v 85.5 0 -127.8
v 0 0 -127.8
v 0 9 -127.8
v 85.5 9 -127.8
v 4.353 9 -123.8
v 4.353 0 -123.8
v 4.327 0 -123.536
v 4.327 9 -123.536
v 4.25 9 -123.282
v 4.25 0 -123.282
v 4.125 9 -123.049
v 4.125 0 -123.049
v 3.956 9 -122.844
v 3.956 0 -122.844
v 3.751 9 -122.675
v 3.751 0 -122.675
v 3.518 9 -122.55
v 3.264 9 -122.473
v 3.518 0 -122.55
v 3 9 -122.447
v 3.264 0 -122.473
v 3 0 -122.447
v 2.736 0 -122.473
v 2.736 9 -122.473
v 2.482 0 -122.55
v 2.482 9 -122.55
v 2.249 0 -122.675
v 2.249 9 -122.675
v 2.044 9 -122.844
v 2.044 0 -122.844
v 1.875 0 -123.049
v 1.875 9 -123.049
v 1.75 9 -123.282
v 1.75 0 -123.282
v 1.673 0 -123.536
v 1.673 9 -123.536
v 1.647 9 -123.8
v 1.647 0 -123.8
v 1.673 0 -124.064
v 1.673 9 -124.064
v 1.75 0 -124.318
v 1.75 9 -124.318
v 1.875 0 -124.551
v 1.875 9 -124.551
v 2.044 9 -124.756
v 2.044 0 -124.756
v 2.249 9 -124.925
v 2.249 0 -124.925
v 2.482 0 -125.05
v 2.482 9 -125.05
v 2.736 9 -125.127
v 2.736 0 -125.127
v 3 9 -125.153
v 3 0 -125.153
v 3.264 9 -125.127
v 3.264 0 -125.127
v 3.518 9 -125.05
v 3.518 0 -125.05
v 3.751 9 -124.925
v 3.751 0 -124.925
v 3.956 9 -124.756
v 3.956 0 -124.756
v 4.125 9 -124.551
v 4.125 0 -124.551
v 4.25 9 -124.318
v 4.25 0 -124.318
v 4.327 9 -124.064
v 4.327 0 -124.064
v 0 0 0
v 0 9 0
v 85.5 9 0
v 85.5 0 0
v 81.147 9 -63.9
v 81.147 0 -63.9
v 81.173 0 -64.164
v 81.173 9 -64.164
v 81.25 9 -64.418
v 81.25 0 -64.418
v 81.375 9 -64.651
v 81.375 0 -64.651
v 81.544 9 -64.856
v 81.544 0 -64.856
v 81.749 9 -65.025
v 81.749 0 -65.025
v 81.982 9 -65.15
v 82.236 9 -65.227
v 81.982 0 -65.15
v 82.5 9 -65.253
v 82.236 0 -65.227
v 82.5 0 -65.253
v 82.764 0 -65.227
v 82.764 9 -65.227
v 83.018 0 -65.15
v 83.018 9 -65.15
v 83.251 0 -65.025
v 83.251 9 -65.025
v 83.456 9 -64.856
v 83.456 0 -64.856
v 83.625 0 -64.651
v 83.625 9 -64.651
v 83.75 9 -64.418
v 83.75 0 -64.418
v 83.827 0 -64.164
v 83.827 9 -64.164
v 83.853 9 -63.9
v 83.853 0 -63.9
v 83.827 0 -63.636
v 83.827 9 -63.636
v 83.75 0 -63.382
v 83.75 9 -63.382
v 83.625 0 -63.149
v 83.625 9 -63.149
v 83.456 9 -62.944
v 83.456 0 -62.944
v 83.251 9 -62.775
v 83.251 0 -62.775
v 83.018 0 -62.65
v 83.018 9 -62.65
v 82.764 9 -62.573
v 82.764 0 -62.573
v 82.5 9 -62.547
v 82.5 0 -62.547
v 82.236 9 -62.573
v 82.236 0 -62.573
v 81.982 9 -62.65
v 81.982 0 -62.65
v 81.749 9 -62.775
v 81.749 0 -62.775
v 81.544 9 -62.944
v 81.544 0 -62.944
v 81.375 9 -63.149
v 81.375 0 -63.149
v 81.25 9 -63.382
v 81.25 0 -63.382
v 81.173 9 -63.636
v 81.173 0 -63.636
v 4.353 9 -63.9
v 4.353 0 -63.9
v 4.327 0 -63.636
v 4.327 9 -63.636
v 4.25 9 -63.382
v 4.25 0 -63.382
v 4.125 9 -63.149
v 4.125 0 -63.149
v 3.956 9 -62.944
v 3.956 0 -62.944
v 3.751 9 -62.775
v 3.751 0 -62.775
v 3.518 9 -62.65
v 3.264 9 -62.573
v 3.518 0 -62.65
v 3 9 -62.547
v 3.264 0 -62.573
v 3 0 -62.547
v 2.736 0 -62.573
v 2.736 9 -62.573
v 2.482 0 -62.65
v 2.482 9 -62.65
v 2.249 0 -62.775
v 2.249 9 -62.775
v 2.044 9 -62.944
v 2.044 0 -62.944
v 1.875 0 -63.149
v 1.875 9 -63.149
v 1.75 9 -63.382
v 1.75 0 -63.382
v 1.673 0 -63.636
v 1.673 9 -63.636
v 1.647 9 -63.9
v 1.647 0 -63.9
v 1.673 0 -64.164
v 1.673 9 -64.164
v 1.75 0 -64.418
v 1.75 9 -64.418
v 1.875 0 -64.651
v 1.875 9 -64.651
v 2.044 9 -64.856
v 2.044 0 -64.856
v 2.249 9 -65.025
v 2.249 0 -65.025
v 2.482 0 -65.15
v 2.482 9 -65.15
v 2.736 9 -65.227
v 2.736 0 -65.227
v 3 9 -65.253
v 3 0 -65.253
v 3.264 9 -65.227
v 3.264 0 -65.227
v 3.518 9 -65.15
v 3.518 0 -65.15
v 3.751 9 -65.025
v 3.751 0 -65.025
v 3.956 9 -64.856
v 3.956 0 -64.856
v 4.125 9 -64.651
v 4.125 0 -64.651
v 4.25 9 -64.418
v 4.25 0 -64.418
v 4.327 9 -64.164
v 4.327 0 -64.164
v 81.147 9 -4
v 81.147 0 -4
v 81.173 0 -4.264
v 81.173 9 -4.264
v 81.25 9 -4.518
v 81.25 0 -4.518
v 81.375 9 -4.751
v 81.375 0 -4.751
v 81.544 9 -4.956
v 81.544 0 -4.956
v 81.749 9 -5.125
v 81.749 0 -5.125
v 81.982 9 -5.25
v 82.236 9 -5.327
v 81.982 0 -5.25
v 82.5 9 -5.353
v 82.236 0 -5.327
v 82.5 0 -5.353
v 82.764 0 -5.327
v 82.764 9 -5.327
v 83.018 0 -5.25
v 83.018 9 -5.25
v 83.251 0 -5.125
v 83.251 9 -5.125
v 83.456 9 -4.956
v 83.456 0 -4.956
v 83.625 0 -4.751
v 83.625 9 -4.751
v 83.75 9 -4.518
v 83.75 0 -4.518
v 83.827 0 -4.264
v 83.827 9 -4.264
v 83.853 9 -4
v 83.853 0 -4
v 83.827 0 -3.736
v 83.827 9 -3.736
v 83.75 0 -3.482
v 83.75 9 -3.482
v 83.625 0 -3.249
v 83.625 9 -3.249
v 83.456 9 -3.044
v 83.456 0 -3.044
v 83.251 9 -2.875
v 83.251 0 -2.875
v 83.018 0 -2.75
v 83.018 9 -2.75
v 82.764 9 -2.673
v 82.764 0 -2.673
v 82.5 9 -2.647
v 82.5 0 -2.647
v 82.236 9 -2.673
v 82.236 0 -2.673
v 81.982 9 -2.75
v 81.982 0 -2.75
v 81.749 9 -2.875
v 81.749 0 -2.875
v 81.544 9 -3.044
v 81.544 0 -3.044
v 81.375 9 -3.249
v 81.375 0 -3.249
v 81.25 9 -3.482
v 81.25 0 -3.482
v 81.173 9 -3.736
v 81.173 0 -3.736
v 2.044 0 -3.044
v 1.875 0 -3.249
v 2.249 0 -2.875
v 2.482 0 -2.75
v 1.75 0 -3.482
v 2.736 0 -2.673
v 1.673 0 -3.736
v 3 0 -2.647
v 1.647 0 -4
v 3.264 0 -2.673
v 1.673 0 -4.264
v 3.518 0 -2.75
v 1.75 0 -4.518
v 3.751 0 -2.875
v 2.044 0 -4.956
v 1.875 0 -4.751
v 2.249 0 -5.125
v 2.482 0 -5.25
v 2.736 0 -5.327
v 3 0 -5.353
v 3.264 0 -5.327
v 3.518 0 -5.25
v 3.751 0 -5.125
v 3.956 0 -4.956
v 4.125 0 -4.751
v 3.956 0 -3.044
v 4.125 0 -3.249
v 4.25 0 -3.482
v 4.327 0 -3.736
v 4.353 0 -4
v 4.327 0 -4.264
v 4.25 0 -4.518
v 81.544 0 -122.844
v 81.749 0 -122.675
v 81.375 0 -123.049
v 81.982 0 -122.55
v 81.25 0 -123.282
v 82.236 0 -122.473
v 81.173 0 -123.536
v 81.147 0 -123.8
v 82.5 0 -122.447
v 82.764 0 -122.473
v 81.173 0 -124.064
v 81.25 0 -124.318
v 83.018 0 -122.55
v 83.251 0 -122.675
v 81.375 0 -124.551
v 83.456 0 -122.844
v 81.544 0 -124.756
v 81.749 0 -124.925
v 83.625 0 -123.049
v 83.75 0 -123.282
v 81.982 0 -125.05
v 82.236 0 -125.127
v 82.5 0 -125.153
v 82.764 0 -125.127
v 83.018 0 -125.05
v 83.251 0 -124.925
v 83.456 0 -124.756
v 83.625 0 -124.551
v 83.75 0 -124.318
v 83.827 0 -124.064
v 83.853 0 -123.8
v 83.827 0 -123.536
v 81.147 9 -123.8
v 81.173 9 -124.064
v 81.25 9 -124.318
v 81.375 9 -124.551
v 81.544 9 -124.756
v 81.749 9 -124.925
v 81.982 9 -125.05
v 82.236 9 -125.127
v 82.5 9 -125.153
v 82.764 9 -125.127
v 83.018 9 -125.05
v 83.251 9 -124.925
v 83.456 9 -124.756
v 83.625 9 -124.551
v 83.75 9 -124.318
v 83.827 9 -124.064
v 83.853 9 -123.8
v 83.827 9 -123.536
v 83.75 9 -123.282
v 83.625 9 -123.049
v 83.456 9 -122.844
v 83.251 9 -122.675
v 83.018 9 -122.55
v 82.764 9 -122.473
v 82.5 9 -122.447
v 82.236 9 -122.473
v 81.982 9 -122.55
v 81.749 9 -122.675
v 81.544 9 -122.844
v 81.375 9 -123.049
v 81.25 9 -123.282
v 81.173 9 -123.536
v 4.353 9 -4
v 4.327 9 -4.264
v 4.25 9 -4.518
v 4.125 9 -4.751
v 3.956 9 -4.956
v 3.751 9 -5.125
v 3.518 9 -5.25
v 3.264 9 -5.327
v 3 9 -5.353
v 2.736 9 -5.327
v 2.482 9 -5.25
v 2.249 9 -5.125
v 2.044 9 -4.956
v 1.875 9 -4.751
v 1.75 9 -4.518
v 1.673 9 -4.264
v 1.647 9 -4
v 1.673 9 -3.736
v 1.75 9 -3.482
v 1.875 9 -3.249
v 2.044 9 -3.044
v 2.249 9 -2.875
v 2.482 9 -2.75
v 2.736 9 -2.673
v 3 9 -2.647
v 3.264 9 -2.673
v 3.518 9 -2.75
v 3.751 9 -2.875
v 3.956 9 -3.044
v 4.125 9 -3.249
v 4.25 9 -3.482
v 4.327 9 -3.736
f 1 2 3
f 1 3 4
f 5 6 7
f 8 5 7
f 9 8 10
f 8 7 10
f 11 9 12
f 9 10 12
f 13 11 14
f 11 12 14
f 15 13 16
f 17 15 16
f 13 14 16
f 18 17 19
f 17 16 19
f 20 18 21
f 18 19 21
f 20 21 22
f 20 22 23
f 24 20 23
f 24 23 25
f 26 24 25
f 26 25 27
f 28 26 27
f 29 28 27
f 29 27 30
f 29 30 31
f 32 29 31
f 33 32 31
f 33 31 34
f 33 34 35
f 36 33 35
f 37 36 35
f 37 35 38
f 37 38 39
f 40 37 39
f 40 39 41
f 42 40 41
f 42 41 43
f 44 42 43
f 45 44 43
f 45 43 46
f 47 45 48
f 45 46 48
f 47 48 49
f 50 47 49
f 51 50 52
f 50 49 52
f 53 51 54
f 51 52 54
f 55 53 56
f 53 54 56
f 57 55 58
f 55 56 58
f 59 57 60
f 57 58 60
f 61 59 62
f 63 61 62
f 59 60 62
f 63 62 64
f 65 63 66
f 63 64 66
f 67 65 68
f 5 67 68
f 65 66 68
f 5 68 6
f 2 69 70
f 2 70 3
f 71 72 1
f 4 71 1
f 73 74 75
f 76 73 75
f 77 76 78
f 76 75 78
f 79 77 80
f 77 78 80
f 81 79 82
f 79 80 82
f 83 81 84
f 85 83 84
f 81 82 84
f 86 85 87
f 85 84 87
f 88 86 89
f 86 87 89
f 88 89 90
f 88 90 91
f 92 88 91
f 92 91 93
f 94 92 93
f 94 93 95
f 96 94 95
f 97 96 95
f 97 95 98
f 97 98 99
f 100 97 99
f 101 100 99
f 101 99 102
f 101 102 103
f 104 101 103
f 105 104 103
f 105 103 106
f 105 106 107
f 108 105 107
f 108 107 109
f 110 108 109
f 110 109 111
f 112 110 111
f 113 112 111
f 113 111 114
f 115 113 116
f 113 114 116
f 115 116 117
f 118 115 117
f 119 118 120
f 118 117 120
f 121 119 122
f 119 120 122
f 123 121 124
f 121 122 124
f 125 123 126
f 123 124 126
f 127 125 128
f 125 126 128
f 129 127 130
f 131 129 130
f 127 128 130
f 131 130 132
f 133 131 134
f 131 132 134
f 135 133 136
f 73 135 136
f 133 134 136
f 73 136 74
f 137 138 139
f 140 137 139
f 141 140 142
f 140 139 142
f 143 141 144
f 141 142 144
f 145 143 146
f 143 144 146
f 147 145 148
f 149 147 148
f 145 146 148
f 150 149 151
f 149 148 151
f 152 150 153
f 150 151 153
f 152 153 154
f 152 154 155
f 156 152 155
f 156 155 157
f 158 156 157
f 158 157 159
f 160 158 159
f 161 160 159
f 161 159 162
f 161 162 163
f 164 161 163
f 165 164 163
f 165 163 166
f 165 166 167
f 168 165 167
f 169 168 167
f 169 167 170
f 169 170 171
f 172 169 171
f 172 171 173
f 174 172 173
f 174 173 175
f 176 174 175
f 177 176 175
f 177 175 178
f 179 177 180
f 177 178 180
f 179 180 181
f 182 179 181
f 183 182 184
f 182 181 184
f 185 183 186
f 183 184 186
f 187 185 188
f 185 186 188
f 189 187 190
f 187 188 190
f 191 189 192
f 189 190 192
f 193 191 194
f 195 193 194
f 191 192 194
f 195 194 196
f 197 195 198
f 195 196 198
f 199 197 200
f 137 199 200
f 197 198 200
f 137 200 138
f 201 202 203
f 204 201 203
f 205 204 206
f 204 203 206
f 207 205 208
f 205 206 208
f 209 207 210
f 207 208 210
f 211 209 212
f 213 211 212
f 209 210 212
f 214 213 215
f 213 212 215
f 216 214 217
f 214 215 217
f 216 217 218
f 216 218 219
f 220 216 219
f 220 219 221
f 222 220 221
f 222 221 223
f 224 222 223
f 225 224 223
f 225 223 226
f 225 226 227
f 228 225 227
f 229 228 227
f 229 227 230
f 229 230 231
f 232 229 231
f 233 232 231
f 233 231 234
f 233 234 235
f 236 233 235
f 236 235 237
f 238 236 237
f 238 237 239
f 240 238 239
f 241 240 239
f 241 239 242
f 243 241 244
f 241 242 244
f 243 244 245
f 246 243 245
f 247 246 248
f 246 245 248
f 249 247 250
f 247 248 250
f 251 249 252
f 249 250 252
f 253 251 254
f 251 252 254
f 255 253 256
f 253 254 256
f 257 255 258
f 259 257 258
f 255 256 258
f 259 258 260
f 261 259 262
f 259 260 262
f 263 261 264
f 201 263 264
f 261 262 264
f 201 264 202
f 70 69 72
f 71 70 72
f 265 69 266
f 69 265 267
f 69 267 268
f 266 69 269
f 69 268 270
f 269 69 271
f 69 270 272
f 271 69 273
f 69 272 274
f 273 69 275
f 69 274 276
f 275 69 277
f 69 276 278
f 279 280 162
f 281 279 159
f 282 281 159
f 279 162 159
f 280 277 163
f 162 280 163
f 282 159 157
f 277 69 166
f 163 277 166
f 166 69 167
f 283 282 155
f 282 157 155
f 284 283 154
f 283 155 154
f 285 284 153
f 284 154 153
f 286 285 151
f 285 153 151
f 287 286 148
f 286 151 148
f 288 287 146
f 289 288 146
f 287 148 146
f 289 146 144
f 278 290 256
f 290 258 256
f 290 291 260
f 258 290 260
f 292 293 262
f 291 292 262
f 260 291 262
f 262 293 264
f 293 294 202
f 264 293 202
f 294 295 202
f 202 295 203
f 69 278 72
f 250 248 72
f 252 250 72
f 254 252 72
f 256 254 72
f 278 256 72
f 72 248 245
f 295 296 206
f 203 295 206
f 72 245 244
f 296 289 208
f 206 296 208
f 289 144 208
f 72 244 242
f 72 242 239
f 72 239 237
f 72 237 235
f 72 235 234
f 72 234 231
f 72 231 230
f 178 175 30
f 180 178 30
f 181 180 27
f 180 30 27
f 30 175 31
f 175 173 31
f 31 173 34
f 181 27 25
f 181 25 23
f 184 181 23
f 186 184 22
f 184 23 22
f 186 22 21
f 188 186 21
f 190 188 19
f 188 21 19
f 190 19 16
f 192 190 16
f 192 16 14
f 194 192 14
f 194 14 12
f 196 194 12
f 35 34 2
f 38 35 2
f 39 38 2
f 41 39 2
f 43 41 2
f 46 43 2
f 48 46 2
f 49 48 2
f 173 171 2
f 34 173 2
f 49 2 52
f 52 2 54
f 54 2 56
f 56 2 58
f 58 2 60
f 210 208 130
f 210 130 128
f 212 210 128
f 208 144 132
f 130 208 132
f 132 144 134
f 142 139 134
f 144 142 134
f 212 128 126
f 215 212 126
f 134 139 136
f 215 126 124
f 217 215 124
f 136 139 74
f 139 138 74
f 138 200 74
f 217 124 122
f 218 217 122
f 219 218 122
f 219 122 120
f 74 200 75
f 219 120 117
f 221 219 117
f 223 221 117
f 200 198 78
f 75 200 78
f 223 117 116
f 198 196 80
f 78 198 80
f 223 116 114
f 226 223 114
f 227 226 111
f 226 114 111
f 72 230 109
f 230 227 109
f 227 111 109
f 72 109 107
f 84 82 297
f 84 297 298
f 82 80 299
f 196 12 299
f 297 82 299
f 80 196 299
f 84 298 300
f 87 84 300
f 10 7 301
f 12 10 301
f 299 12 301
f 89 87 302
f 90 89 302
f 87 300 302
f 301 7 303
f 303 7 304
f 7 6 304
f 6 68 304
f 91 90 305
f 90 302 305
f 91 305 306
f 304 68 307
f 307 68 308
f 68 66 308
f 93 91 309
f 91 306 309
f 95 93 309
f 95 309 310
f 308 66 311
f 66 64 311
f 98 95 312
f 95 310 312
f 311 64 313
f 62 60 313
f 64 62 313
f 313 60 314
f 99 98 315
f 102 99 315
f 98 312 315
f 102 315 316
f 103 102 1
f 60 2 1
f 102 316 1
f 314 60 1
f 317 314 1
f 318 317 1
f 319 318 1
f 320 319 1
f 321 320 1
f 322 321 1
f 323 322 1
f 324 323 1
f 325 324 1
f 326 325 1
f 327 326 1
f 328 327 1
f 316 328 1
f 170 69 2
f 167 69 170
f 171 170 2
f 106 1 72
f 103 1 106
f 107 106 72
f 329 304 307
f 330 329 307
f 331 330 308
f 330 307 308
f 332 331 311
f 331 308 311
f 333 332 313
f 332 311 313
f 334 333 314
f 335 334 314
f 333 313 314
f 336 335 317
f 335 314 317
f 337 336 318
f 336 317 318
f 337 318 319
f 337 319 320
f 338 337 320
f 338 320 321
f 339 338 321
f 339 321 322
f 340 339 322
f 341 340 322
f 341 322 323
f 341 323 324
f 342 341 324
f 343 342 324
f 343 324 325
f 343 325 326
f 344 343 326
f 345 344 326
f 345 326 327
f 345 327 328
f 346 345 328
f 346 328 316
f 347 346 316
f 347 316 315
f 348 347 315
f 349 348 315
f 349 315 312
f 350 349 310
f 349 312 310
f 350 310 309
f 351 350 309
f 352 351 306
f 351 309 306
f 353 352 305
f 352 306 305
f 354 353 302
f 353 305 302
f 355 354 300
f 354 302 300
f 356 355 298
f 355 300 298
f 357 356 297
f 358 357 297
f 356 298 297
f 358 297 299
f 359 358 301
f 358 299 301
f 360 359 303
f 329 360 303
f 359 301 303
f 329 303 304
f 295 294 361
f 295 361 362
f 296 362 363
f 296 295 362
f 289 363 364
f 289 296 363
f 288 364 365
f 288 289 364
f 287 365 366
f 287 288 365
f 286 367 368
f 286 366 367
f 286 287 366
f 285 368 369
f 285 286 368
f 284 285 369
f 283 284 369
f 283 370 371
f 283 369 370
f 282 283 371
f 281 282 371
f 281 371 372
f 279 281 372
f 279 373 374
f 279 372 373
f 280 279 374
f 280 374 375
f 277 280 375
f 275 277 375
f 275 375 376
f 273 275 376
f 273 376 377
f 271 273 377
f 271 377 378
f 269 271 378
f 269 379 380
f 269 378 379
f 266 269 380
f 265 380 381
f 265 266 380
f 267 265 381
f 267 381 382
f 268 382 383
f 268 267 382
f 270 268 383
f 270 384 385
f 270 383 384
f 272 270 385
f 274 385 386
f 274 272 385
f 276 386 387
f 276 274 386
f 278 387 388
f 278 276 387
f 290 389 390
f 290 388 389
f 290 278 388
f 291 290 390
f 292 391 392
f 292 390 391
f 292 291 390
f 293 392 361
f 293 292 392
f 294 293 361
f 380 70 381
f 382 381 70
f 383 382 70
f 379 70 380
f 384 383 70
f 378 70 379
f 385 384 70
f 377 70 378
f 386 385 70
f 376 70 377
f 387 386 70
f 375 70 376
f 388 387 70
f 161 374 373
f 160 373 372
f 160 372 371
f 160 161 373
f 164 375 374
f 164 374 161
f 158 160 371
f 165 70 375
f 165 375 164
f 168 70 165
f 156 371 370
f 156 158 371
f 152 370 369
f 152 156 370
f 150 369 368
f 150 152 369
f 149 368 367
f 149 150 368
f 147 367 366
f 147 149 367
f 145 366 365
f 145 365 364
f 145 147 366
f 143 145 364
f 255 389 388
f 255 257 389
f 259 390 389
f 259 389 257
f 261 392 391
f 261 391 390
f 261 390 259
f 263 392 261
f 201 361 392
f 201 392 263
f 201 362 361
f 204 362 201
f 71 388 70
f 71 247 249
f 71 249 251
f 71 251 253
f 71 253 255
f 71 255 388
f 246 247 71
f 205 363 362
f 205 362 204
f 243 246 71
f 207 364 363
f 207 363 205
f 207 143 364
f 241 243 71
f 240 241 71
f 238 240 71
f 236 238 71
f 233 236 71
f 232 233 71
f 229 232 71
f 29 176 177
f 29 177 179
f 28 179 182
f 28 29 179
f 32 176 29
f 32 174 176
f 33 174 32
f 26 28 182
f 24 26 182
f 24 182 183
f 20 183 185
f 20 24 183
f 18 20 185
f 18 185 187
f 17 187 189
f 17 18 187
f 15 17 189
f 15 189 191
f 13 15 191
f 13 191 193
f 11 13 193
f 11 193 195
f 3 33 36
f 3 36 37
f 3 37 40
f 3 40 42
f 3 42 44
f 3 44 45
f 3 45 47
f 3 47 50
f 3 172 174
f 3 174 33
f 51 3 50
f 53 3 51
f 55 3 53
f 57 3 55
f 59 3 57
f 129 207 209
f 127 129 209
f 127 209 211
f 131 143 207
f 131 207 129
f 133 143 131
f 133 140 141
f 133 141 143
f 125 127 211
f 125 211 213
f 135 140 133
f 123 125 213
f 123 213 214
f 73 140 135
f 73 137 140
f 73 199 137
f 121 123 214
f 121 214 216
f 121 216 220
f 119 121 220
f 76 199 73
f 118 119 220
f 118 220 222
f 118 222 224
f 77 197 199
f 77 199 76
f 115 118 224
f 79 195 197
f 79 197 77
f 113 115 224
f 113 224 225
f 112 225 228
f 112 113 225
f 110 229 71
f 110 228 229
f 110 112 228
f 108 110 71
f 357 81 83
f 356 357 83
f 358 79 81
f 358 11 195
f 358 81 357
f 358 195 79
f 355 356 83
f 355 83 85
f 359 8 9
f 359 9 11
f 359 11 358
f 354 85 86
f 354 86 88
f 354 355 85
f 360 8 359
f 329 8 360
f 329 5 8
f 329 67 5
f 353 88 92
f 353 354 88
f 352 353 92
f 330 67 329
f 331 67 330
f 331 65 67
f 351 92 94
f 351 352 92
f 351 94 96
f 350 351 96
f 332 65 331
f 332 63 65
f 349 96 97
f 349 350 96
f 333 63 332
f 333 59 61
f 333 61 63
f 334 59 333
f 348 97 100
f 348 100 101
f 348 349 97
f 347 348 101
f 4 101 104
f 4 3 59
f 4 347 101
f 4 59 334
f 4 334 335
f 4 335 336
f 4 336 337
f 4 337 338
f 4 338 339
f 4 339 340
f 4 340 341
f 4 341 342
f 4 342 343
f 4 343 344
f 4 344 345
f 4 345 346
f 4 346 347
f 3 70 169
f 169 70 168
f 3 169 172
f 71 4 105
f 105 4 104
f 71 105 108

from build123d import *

# Parameters (mm, degrees)
SKETCH1_W                 = 85.5
SKETCH1_H                 = 127.8
BOSS_EXTRUDE1_DEPTH       = 9
TAP_DRILL_FOR_6_32_TAP1_D = 2.7051
LPATTERN1_COUNT           = 3
LPATTERN1_PITCH           = 59.9
MIRROR1_COPY_1_D          = 2.7051
MIRROR1_COPY_2_D          = 2.7051


with BuildPart() as part:
    # Sketch1 → Boss-Extrude1 (new body)
    with BuildSketch(Plane(origin=(0, 0, 0), x_dir=(1, 0, 0), z_dir=(0, 1, 0))):
        with Locations((42.75, 63.9)):
            Rectangle(SKETCH1_W, SKETCH1_H)
    extrude(amount=BOSS_EXTRUDE1_DEPTH)

    # Tap Drill for #6-32 Tap1 (through all)
    with Locations(Plane(origin=(0, 9, 0), x_dir=(1, 0, 0), z_dir=(0, 1, 0))):
        with Locations((82.5, 4)):
            tap_drill_for_6_32_tap1 = Hole(TAP_DRILL_FOR_6_32_TAP1_D / 2)

    # LPattern1: Tap Drill for #6-32 Tap1 ×3
    with Locations(*[(0, 0, -i * LPATTERN1_PITCH) for i in range(1, LPATTERN1_COUNT)]):
        add(tap_drill_for_6_32_tap1, mode=Mode.SUBTRACT)

    # Mirror1: Tap Drill for #6-32 Tap1 across plane
    add(tap_drill_for_6_32_tap1.mirror(Plane(origin=(42.75, 0, 0), x_dir=(0, 0, 1), z_dir=(1, 0, 0))), mode=Mode.SUBTRACT)

    # Mirror1 copy 1 (through all)
    with Locations(Plane(origin=(85.5, 9, -59.9), x_dir=(-1, 0, 0), z_dir=(0, 1, 0))):
        with Locations((82.5, -4)):
            Hole(MIRROR1_COPY_1_D / 2)

    # Mirror1 copy 2 (through all)
    with Locations(Plane(origin=(85.5, 9, -119.8), x_dir=(-1, 0, 0), z_dir=(0, 1, 0))):
        with Locations((82.5, -4)):
            Hole(MIRROR1_COPY_2_D / 2)


solid = part.part
